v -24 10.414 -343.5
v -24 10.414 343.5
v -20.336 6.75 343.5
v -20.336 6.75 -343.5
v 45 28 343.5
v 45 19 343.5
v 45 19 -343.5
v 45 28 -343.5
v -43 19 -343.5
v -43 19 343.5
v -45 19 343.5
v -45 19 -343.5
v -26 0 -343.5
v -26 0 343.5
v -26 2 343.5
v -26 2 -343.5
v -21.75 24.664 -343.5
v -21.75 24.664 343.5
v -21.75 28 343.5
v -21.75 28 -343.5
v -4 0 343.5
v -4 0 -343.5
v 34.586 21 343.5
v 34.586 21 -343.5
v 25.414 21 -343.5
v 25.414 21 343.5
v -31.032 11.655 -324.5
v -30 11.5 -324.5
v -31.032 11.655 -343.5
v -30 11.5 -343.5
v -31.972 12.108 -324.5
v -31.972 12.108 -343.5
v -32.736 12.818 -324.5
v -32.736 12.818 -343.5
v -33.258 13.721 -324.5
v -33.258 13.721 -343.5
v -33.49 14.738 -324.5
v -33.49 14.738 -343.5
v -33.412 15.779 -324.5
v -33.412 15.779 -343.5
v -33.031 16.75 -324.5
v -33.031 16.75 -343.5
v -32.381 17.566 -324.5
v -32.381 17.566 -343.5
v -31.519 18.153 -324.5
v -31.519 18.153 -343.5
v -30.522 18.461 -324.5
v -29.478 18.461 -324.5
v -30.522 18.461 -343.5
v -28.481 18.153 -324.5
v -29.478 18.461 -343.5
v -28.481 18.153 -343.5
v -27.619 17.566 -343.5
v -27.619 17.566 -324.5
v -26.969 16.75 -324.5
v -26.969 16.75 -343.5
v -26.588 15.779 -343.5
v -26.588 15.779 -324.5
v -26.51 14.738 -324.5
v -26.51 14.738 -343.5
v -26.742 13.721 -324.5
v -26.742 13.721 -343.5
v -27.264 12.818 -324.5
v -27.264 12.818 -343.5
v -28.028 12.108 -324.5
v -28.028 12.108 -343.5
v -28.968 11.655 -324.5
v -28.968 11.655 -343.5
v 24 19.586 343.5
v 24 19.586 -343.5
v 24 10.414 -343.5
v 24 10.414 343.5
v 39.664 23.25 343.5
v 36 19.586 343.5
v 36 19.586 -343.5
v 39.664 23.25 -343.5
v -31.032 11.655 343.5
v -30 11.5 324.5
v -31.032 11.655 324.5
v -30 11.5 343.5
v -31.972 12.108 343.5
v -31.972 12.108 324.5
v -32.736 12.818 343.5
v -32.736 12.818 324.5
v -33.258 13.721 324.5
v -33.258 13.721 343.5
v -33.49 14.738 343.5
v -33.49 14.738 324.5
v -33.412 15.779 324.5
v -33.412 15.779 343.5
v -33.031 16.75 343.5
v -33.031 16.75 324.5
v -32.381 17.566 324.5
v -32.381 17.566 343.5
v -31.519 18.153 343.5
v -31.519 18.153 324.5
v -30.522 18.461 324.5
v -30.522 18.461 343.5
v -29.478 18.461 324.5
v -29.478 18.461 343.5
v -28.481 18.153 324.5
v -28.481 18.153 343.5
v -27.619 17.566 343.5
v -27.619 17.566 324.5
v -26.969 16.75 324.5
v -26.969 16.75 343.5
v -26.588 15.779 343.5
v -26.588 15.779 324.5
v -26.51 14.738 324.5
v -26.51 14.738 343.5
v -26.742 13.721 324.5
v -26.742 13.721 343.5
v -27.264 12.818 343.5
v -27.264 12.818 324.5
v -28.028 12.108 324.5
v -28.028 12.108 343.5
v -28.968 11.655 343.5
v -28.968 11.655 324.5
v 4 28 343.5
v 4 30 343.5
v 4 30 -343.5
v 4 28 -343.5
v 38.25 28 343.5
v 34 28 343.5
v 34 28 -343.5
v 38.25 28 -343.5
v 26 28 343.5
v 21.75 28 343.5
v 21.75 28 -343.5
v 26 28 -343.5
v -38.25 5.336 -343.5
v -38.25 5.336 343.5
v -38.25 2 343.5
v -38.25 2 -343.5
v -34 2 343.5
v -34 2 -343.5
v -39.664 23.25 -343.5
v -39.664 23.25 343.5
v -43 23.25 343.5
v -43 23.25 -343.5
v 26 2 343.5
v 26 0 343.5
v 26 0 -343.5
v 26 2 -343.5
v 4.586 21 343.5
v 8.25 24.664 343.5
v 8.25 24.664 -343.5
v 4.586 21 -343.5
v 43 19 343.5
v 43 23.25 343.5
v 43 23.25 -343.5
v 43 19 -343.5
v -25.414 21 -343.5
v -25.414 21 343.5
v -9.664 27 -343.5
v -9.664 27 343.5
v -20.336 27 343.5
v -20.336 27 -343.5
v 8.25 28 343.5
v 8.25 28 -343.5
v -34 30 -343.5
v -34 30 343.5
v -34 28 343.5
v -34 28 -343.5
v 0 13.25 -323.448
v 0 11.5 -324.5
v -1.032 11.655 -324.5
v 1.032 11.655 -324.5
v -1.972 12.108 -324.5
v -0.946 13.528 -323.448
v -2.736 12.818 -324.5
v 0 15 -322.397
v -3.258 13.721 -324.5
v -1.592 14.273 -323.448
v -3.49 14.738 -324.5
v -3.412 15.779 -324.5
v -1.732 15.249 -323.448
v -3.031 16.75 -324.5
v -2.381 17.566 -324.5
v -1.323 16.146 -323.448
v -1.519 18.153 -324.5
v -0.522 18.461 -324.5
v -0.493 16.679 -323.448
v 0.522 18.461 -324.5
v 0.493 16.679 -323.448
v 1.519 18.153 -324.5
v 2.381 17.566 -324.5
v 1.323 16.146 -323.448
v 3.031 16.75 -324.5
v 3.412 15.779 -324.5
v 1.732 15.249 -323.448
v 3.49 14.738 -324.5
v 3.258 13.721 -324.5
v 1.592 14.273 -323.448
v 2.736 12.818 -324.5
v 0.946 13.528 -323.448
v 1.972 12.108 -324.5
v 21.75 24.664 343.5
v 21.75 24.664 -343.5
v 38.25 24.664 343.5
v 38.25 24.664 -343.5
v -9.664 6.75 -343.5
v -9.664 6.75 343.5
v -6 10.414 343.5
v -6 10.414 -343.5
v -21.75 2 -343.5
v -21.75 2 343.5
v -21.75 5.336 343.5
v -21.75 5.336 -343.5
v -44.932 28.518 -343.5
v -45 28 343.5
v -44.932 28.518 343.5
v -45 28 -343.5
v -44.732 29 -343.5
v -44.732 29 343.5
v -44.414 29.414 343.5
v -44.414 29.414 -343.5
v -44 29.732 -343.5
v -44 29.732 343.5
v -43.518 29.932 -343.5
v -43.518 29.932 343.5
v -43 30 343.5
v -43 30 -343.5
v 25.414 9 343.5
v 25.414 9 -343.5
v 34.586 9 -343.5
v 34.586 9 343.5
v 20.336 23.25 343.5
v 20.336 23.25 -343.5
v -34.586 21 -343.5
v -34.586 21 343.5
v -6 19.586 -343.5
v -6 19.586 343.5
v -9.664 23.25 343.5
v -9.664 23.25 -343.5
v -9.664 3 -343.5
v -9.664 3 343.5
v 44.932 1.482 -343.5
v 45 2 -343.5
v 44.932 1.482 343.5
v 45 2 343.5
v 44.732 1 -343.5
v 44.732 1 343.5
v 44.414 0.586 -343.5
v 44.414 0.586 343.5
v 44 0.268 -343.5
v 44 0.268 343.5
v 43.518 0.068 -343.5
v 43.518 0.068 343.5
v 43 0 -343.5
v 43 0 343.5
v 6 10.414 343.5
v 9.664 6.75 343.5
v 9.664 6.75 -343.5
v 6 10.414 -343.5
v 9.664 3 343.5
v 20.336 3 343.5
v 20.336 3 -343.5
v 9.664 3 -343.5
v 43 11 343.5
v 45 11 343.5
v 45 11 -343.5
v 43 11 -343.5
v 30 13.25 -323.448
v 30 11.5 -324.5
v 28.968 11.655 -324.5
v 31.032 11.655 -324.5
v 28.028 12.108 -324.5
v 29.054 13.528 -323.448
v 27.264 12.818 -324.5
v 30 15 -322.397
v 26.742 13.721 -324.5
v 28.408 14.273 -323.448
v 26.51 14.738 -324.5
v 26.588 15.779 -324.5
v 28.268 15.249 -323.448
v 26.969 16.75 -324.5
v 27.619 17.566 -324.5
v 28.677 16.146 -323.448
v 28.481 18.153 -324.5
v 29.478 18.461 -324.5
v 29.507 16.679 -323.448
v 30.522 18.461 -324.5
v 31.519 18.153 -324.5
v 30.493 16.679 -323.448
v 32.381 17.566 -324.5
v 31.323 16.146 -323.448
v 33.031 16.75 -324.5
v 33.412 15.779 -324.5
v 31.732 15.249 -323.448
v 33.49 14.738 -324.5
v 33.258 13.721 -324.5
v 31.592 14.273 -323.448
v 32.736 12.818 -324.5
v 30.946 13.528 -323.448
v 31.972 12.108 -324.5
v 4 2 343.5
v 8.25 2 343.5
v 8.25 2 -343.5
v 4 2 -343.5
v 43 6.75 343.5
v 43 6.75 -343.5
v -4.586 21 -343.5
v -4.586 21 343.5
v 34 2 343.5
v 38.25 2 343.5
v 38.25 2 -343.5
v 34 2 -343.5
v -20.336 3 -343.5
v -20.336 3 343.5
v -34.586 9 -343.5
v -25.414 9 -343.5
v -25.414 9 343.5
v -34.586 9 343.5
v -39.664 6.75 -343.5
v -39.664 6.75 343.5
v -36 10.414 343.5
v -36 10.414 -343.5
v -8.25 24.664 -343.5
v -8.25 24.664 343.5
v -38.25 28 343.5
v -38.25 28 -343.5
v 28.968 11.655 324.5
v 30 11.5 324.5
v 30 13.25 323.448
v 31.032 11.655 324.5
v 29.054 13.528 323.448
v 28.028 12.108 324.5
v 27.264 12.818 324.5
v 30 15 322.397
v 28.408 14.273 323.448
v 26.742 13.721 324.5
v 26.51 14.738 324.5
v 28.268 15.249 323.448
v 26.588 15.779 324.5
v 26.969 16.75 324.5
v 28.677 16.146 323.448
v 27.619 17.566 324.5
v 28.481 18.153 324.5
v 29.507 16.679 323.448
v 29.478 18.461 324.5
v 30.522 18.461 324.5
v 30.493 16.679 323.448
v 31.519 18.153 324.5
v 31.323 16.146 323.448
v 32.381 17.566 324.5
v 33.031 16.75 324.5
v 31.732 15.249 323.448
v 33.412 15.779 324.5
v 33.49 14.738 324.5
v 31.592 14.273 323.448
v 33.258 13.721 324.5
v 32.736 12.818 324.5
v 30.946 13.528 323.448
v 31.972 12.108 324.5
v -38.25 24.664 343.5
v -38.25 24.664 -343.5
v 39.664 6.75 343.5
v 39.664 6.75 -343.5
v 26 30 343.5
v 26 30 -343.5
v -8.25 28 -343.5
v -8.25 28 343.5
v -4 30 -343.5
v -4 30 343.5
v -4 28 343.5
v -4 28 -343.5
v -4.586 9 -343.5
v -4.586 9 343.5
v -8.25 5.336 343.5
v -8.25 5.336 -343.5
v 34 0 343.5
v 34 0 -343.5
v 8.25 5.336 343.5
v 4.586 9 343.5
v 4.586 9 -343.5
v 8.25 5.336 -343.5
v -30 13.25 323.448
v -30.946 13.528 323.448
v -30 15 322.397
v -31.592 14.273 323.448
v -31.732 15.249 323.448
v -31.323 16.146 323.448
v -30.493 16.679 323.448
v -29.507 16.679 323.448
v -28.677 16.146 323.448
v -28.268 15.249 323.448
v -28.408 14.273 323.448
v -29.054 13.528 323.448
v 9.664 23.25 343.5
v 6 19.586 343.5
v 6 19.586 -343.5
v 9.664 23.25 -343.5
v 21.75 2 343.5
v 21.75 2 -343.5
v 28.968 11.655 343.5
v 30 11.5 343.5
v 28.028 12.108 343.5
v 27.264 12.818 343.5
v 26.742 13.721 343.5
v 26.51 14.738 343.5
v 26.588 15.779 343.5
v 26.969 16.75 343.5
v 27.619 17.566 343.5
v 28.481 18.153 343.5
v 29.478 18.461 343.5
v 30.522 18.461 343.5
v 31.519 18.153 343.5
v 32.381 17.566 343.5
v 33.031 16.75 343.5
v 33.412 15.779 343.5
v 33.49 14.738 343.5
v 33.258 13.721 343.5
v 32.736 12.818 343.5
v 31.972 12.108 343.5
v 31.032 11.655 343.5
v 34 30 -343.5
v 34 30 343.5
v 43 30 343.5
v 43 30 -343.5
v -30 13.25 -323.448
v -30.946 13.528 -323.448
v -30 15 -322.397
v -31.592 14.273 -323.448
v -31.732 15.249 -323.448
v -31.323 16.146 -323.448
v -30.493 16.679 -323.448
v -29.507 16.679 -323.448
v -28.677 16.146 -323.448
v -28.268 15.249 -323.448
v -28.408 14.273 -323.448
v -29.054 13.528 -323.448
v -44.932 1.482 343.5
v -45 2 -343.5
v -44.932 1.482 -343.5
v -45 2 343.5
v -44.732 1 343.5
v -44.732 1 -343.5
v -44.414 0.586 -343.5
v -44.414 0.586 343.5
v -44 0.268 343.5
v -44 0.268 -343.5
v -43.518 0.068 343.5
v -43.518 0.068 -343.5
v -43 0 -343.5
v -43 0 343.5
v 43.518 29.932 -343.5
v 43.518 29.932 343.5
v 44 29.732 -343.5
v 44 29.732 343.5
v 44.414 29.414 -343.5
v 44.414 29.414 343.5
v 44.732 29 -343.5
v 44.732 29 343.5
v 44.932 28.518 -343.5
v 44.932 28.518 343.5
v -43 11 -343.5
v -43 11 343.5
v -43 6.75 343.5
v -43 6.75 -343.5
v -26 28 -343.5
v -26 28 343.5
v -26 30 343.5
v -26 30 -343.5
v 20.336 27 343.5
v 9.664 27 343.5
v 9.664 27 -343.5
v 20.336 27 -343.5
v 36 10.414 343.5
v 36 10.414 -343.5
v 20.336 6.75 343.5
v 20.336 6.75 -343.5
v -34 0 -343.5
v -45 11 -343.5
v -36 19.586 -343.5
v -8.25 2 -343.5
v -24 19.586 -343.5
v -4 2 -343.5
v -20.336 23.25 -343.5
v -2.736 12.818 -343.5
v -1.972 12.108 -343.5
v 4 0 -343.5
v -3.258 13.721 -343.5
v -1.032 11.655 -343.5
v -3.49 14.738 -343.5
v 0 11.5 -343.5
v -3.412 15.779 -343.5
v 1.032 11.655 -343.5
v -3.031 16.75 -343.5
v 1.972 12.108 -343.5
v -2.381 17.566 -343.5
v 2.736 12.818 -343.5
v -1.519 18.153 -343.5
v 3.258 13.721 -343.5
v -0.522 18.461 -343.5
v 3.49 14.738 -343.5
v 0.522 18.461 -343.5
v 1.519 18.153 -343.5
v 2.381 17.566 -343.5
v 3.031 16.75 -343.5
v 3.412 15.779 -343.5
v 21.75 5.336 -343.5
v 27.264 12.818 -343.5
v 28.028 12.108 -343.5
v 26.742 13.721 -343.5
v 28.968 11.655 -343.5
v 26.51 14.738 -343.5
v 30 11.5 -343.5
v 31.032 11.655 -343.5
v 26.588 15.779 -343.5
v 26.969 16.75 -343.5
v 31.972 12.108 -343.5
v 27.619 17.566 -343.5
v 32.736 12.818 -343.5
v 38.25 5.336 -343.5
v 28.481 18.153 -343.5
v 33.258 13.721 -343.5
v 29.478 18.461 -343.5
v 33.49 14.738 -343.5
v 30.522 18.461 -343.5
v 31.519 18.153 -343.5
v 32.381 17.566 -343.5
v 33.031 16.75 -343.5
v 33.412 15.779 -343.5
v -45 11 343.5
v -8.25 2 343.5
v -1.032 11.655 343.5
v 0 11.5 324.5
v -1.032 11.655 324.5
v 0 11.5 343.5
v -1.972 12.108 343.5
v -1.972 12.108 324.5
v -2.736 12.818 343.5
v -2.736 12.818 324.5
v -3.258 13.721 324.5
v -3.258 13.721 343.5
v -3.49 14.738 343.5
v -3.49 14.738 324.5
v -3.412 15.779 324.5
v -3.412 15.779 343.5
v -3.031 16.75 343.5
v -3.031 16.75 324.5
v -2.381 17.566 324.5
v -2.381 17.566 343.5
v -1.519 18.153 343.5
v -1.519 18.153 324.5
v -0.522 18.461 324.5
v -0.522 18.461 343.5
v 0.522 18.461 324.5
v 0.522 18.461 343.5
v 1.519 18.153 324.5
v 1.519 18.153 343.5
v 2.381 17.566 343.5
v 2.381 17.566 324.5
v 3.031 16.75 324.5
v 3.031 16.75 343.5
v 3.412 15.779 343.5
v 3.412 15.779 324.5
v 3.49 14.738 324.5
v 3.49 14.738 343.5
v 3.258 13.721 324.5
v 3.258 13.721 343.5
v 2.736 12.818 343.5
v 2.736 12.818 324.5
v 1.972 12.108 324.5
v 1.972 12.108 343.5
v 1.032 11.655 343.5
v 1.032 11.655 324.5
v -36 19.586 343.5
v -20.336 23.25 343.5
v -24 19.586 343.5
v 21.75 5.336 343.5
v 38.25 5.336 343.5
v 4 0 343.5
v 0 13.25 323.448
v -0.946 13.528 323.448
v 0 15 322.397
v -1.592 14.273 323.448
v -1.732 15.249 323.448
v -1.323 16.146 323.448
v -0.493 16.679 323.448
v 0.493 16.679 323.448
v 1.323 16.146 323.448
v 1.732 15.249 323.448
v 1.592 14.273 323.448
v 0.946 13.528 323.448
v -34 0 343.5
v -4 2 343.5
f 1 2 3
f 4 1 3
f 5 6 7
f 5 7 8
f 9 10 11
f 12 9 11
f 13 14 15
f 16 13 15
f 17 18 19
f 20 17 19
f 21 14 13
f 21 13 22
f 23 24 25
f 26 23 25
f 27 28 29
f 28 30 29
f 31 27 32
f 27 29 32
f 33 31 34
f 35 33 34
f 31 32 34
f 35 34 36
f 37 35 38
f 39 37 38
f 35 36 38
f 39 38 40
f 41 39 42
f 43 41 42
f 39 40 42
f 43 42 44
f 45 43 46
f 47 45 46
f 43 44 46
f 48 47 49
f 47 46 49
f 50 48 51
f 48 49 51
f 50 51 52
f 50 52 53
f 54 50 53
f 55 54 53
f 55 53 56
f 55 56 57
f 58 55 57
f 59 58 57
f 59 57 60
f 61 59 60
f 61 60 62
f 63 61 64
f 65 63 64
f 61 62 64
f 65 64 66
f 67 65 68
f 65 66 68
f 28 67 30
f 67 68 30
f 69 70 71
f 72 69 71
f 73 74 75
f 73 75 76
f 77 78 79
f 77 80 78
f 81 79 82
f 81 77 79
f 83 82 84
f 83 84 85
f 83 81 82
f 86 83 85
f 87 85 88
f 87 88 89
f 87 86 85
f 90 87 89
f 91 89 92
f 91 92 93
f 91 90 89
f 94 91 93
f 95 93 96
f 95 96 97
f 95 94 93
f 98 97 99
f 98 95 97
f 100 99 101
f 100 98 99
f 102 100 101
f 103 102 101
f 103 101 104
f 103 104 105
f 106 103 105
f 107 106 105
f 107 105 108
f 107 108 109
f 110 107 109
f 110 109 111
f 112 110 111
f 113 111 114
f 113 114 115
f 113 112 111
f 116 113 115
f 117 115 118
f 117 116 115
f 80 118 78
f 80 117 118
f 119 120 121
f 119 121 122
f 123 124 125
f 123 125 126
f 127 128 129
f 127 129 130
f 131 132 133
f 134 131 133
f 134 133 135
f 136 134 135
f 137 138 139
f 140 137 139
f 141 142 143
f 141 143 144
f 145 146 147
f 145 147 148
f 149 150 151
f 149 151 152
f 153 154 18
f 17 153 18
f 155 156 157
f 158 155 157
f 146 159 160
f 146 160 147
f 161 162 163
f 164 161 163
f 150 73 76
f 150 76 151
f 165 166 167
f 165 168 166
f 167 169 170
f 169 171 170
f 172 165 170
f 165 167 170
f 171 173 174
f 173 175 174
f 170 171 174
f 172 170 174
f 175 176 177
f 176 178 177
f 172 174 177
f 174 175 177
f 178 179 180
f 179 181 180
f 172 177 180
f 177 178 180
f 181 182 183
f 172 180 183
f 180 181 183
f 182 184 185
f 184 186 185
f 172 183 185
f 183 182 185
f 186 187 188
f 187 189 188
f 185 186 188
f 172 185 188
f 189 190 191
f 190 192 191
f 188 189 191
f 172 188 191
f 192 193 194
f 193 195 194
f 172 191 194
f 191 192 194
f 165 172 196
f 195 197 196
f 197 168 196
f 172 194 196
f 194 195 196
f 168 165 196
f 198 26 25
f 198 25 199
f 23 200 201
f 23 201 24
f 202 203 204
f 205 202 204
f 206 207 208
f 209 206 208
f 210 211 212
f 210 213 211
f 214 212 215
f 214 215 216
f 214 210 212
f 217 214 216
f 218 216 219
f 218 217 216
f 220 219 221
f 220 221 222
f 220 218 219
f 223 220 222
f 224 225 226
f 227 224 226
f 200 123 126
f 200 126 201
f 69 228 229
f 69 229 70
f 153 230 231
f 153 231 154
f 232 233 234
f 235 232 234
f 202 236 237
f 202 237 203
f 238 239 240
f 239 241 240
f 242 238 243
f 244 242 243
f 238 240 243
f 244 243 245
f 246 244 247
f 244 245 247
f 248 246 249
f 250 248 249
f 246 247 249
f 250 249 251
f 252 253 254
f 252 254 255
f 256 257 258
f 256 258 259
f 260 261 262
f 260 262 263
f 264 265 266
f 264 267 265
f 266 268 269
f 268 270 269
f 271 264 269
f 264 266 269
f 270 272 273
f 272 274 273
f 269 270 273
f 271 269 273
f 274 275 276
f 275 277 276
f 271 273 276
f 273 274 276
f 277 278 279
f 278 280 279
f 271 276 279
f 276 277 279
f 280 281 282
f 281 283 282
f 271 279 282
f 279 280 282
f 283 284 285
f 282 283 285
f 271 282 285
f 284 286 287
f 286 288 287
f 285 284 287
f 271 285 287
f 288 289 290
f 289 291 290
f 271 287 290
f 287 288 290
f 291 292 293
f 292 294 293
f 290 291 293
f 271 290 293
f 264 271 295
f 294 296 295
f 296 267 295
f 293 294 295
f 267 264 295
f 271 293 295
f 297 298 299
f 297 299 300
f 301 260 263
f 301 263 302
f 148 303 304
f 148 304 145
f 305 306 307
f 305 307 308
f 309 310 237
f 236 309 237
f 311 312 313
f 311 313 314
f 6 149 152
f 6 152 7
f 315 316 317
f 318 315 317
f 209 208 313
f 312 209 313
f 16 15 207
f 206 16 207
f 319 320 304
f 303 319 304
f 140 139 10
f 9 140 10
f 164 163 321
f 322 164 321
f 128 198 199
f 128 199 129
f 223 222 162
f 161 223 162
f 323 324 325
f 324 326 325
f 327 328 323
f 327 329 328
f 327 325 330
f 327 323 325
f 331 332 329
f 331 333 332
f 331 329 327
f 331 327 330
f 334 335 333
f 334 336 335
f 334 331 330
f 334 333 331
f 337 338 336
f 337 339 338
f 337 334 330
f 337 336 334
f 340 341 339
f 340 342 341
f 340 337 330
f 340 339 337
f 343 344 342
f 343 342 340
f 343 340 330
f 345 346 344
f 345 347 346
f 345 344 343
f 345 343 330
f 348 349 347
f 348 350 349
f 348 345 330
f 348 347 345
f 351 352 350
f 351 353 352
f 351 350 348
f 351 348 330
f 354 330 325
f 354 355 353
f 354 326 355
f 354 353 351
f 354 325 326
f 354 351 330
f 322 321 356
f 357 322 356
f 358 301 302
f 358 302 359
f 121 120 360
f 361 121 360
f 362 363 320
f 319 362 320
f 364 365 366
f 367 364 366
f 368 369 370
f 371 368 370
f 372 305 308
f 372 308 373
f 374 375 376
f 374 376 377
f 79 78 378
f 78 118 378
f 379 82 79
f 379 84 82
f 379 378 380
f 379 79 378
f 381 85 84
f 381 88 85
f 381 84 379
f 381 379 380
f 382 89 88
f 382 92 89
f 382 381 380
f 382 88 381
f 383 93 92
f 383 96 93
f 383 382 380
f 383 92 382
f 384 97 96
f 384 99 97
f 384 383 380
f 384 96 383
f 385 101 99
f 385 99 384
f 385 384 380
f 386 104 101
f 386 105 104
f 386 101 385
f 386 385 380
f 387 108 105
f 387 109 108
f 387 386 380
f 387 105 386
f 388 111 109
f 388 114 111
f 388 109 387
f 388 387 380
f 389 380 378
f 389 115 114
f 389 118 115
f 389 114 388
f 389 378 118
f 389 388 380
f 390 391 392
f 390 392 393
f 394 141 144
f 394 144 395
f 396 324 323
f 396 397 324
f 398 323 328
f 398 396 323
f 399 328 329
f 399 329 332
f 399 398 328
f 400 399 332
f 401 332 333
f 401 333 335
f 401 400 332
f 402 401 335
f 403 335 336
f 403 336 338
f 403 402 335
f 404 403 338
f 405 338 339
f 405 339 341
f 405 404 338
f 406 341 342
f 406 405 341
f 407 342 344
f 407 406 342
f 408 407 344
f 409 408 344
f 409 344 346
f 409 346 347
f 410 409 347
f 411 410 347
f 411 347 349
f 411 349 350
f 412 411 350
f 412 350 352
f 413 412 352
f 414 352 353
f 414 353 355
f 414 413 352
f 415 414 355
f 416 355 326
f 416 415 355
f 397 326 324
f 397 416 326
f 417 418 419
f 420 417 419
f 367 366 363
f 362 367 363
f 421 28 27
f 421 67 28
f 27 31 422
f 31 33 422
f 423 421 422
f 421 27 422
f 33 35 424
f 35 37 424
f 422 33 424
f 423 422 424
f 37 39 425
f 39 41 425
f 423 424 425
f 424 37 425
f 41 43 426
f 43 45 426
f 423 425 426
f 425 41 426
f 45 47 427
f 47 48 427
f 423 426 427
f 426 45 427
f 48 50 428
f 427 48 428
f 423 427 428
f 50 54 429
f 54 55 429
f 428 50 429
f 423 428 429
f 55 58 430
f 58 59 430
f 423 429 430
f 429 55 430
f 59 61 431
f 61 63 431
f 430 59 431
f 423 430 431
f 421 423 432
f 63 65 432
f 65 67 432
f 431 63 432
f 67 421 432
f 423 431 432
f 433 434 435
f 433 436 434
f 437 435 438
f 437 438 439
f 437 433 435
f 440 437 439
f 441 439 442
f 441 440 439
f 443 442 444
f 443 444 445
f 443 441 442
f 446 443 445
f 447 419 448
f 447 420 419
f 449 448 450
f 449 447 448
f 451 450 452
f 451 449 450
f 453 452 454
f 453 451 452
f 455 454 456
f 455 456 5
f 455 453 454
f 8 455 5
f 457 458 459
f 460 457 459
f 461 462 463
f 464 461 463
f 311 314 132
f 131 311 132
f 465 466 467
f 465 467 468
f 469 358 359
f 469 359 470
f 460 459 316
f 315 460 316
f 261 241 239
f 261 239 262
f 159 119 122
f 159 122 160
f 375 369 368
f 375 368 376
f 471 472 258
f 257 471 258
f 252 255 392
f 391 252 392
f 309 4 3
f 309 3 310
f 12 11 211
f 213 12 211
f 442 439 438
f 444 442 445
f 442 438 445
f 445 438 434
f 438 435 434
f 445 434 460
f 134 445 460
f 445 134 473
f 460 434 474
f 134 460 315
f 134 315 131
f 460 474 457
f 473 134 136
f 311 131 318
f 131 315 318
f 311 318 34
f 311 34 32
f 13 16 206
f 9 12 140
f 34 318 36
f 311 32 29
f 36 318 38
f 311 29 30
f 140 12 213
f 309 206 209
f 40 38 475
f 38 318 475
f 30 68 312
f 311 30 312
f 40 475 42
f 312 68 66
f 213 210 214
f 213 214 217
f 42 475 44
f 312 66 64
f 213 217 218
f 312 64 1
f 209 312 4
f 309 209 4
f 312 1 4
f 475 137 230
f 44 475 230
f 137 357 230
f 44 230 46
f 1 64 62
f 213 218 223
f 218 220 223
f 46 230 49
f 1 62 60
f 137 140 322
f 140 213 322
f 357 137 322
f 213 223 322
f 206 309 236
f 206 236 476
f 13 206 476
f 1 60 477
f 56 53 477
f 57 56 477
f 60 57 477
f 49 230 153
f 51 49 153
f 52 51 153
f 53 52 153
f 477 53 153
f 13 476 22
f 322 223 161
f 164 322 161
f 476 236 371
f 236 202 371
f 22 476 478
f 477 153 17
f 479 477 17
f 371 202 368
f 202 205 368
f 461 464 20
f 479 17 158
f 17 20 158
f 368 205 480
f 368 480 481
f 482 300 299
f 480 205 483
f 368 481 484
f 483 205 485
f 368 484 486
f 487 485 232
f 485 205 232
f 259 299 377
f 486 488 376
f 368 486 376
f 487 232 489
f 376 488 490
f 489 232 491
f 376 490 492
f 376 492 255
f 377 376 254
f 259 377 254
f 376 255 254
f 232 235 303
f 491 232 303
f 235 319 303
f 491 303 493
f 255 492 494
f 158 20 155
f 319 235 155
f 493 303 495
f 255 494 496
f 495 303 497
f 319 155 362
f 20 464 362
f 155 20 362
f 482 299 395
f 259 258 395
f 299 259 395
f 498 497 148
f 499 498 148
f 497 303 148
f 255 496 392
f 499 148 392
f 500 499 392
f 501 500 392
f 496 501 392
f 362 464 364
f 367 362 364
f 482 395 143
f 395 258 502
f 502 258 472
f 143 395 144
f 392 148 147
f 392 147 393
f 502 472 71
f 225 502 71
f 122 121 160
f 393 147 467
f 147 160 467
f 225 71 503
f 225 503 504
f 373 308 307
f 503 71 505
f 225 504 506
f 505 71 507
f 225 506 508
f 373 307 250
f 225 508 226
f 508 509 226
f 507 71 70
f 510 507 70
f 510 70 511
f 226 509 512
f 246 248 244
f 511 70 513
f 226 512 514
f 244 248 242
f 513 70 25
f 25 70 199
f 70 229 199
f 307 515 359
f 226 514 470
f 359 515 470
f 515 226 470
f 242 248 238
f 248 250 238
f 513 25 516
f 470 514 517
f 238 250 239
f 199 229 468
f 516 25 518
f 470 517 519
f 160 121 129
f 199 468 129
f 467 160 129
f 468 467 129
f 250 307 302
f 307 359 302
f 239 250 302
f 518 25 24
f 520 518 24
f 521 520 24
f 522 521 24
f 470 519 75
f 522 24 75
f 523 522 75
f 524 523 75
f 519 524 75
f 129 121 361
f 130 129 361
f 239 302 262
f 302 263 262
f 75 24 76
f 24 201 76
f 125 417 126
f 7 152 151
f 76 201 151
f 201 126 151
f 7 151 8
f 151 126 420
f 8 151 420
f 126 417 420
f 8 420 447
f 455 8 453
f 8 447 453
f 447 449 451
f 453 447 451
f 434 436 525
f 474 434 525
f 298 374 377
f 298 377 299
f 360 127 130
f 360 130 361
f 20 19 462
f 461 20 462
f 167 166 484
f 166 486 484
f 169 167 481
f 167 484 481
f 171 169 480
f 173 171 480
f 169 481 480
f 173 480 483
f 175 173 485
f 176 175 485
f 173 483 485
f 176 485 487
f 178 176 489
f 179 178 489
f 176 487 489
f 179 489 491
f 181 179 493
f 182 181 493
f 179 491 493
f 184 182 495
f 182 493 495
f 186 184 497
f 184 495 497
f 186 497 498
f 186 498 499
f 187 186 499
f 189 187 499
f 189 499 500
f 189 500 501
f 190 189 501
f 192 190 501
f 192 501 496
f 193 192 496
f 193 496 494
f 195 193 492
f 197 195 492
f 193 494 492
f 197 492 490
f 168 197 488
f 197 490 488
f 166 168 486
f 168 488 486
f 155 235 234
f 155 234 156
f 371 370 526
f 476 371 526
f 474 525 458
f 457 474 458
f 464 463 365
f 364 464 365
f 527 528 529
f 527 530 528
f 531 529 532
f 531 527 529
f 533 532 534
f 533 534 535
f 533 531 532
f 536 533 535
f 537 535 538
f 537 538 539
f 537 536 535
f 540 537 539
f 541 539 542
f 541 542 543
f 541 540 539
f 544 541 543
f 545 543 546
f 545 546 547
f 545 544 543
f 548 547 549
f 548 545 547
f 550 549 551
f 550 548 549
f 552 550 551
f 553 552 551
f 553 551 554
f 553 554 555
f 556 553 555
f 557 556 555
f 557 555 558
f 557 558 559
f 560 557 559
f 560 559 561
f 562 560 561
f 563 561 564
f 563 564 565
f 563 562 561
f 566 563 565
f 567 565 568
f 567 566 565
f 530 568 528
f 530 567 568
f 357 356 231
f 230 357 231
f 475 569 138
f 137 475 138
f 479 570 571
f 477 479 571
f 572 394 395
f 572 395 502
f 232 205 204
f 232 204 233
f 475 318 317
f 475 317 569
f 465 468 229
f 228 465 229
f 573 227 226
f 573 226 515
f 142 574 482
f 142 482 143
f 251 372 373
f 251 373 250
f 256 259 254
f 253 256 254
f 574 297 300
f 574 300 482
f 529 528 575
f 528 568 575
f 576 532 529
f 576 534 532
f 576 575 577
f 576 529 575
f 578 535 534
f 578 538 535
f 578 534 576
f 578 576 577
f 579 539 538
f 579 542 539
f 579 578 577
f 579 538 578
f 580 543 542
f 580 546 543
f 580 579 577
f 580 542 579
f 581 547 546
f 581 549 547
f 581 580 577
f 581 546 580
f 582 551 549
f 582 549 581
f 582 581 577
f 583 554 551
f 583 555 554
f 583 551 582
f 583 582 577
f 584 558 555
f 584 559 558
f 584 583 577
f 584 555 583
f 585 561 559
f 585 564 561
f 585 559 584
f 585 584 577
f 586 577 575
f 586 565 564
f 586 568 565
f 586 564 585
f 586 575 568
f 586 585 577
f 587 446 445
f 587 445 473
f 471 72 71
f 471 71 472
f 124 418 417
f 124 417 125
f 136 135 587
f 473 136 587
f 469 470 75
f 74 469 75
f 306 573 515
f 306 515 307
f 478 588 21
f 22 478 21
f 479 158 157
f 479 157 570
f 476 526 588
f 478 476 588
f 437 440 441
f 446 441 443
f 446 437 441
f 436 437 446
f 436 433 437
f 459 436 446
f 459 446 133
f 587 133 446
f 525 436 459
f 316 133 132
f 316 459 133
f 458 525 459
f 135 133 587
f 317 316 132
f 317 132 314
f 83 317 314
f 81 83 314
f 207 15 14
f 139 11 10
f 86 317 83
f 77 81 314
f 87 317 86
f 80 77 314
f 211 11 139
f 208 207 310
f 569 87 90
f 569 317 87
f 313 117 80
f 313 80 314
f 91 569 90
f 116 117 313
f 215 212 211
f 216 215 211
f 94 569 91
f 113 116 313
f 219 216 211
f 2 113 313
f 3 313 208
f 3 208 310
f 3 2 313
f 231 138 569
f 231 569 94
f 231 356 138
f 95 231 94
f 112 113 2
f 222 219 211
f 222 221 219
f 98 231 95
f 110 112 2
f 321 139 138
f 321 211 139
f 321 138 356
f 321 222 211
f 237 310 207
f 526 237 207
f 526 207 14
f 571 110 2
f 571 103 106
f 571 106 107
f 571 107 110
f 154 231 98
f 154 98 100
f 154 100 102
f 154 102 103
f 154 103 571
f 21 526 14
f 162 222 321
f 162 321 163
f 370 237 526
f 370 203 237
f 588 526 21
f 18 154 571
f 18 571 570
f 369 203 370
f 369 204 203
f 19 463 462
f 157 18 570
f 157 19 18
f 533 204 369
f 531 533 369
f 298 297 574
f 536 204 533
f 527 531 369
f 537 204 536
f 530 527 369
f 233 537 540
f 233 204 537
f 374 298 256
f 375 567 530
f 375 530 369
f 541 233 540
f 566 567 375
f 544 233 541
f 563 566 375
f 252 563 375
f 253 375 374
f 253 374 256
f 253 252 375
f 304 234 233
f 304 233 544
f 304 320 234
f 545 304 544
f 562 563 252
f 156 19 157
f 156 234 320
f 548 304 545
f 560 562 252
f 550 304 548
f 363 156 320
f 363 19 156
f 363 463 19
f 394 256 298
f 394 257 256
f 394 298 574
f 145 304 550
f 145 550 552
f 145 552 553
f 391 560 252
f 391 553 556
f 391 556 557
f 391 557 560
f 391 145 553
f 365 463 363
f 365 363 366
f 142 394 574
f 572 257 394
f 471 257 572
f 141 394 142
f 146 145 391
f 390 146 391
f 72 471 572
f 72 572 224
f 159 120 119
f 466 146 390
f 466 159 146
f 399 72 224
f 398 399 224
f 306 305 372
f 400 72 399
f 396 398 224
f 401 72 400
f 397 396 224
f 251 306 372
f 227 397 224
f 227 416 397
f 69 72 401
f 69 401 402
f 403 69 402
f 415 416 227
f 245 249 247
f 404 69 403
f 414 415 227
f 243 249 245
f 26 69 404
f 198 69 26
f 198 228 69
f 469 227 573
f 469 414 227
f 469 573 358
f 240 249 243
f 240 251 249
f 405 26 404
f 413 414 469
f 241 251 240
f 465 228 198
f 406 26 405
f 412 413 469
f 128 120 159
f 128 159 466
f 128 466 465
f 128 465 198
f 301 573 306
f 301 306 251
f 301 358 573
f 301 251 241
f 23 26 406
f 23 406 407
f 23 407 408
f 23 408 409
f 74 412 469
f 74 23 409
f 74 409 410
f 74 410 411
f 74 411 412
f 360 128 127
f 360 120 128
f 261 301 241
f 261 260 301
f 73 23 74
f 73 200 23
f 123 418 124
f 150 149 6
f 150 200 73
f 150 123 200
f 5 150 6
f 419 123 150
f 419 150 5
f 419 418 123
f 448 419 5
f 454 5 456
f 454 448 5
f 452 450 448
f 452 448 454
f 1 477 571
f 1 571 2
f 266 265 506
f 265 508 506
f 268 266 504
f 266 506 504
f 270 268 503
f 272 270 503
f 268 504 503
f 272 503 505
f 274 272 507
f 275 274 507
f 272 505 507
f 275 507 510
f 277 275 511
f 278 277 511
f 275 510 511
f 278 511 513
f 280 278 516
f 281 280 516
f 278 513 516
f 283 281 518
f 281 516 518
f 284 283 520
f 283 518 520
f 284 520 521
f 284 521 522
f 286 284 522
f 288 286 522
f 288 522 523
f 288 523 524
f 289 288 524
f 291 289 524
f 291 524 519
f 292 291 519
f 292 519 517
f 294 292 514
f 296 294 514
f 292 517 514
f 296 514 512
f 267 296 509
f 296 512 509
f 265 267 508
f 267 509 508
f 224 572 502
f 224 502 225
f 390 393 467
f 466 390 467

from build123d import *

# Parameters (mm, degrees)
SKETCH1_W                      = 90
SKETCH1_H                      = 30
BOSS_EXTRUDE1_DEPTH            = 343.5
M8X1_0_TAPPED_HOLE1_AT_2_COUNT = 2
M8X1_0_TAPPED_HOLE1_AT_2_PITCH = 60
M8X1_0_TAPPED_HOLE1_AT_3_COUNT = 2
M8X1_0_TAPPED_HOLE1_AT_3_PITCH = 30
CUT_EXTRUDE1_DEPTH             = 690.125532831
FILLET1_R                      = 2


with BuildPart() as part:
    # Sketch1 → Boss-Extrude1 (new, symmetric)
    with BuildSketch(Plane.XY):
        with Locations((0, 15)):
            Rectangle(SKETCH1_W, SKETCH1_H)
    extrude(amount=BOSS_EXTRUDE1_DEPTH, both=True)

    # Sketch3 → M8x1.0 Tapped Hole1 (revolve, cut)
    with BuildSketch(Plane(origin=(30, 15, 343.5), x_dir=(0, -1, 0), z_dir=(1, 0, 0))):
        Polygon((0, 0), (0, 21.103012167), (3.5, 19), (3.5, 0), align=None)
    m8x1_0_tapped_hole1 = revolve(axis=Axis((30, 15, 349.85), (0, 0, -1)), mode=Mode.SUBTRACT)

    # M8x1.0 Tapped Hole1 at 2: M8x1.0 Tapped Hole1 ×2
    with Locations(*[(-i * M8X1_0_TAPPED_HOLE1_AT_2_PITCH, 0, 0) for i in range(1, M8X1_0_TAPPED_HOLE1_AT_2_COUNT)]):
        add(m8x1_0_tapped_hole1, mode=Mode.SUBTRACT)

    # M8x1.0 Tapped Hole1 at 3: M8x1.0 Tapped Hole1 ×2
    with Locations(*[(-i * M8X1_0_TAPPED_HOLE1_AT_3_PITCH, 0, 0) for i in range(1, M8X1_0_TAPPED_HOLE1_AT_3_COUNT)]):
        add(m8x1_0_tapped_hole1, mode=Mode.SUBTRACT)

    # Mirror1: M8x1.0 Tapped Hole1 across plane
    add(m8x1_0_tapped_hole1.mirror(Plane.XY), mode=Mode.SUBTRACT)

    # Mirror1 copy 1 sketch → Mirror1 copy 1 (revolve, cut)
    with BuildSketch(Plane(origin=(-30, 15, -343.5), x_dir=(0, -1, 0), z_dir=(1, 0, 0))):
        Polygon((0, 0), (0, -21.103012167), (3.5, -19), (3.5, 0), align=None)
    revolve(axis=Axis((-30, 15, -349.85), (0, 0, -1)), mode=Mode.SUBTRACT)

    # Mirror1 copy 2 sketch → Mirror1 copy 2 (revolve, cut)
    with BuildSketch(Plane(origin=(0, 15, -343.5), x_dir=(0, -1, 0), z_dir=(1, 0, 0))):
        Polygon((0, 0), (0, -21.103012167), (3.5, -19), (3.5, 0), align=None)
    revolve(axis=Axis((0, 15, -349.85), (0, 0, -1)), mode=Mode.SUBTRACT)

    # Sketch4 → Cut-Extrude1 (cut, through all)
    with BuildSketch(Plane.XY.offset(343.5)):
        Polygon((-4, 2), (-4, 0), (0, 0), (0, 9), (-4.585786438, 9), (-8.25, 5.335786438), (-8.25, 2), align=None)
        Polygon((0, 30), (-4, 30), (-4, 28), (-8.25, 28), (-8.25, 24.664213562), (-4.585786438, 21), (0, 21), align=None)
        Polygon((-34, 2), (-34, 0), (-30, 0), (-26, 0), (-26, 2), (-21.75, 2), (-21.75, 5.335786438), (-25.414213562, 9), (-34.585786438, 9), (-38.25, 5.335786438), (-38.25, 2), align=None)
        Polygon((-20.335786438, 3), (-9.664213562, 3), (-9.664213562, 6.75), (-6, 10.414213562), (-6, 19.585786438), (-9.664213562, 23.25), (-9.664213562, 27), (-20.335786438, 27), (-20.335786438, 23.25), (-24, 19.585786438), (-24, 10.414213562), (-20.335786438, 6.75), align=None)
        Polygon((-30, 30), (-34, 30), (-34, 28), (-38.25, 28), (-38.25, 24.664213562), (-34.585786438, 21), (-25.414213562, 21), (-21.75, 24.664213562), (-21.75, 28), (-26, 28), (-26, 30), align=None)
        Polygon((-43, 19), (-45, 19), (-45, 15), (-45, 11), (-43, 11), (-43, 6.75), (-39.664213562, 6.75), (-36, 10.414213562), (-36, 19.585786438), (-39.664213562, 23.25), (-43, 23.25), align=None)
    cut_extrude1 = extrude(amount=-CUT_EXTRUDE1_DEPTH, mode=Mode.SUBTRACT)

    # Mirror2: Cut-Extrude1 across plane
    add(cut_extrude1.mirror(Plane(origin=(0, 0, 0), x_dir=(0, 0, 1), z_dir=(1, 0, 0))), mode=Mode.SUBTRACT)

    # Fillet1
    fillet1_edges = [part.edges().sort_by_distance(p)[0] for p in [
        (-45, 30, 0),
        (45, 30, 0),
        (45, 0, 0),
        (-45, 0, 0),
    ]]
    fillet(fillet1_edges, radius=FILLET1_R)


solid = part.part
